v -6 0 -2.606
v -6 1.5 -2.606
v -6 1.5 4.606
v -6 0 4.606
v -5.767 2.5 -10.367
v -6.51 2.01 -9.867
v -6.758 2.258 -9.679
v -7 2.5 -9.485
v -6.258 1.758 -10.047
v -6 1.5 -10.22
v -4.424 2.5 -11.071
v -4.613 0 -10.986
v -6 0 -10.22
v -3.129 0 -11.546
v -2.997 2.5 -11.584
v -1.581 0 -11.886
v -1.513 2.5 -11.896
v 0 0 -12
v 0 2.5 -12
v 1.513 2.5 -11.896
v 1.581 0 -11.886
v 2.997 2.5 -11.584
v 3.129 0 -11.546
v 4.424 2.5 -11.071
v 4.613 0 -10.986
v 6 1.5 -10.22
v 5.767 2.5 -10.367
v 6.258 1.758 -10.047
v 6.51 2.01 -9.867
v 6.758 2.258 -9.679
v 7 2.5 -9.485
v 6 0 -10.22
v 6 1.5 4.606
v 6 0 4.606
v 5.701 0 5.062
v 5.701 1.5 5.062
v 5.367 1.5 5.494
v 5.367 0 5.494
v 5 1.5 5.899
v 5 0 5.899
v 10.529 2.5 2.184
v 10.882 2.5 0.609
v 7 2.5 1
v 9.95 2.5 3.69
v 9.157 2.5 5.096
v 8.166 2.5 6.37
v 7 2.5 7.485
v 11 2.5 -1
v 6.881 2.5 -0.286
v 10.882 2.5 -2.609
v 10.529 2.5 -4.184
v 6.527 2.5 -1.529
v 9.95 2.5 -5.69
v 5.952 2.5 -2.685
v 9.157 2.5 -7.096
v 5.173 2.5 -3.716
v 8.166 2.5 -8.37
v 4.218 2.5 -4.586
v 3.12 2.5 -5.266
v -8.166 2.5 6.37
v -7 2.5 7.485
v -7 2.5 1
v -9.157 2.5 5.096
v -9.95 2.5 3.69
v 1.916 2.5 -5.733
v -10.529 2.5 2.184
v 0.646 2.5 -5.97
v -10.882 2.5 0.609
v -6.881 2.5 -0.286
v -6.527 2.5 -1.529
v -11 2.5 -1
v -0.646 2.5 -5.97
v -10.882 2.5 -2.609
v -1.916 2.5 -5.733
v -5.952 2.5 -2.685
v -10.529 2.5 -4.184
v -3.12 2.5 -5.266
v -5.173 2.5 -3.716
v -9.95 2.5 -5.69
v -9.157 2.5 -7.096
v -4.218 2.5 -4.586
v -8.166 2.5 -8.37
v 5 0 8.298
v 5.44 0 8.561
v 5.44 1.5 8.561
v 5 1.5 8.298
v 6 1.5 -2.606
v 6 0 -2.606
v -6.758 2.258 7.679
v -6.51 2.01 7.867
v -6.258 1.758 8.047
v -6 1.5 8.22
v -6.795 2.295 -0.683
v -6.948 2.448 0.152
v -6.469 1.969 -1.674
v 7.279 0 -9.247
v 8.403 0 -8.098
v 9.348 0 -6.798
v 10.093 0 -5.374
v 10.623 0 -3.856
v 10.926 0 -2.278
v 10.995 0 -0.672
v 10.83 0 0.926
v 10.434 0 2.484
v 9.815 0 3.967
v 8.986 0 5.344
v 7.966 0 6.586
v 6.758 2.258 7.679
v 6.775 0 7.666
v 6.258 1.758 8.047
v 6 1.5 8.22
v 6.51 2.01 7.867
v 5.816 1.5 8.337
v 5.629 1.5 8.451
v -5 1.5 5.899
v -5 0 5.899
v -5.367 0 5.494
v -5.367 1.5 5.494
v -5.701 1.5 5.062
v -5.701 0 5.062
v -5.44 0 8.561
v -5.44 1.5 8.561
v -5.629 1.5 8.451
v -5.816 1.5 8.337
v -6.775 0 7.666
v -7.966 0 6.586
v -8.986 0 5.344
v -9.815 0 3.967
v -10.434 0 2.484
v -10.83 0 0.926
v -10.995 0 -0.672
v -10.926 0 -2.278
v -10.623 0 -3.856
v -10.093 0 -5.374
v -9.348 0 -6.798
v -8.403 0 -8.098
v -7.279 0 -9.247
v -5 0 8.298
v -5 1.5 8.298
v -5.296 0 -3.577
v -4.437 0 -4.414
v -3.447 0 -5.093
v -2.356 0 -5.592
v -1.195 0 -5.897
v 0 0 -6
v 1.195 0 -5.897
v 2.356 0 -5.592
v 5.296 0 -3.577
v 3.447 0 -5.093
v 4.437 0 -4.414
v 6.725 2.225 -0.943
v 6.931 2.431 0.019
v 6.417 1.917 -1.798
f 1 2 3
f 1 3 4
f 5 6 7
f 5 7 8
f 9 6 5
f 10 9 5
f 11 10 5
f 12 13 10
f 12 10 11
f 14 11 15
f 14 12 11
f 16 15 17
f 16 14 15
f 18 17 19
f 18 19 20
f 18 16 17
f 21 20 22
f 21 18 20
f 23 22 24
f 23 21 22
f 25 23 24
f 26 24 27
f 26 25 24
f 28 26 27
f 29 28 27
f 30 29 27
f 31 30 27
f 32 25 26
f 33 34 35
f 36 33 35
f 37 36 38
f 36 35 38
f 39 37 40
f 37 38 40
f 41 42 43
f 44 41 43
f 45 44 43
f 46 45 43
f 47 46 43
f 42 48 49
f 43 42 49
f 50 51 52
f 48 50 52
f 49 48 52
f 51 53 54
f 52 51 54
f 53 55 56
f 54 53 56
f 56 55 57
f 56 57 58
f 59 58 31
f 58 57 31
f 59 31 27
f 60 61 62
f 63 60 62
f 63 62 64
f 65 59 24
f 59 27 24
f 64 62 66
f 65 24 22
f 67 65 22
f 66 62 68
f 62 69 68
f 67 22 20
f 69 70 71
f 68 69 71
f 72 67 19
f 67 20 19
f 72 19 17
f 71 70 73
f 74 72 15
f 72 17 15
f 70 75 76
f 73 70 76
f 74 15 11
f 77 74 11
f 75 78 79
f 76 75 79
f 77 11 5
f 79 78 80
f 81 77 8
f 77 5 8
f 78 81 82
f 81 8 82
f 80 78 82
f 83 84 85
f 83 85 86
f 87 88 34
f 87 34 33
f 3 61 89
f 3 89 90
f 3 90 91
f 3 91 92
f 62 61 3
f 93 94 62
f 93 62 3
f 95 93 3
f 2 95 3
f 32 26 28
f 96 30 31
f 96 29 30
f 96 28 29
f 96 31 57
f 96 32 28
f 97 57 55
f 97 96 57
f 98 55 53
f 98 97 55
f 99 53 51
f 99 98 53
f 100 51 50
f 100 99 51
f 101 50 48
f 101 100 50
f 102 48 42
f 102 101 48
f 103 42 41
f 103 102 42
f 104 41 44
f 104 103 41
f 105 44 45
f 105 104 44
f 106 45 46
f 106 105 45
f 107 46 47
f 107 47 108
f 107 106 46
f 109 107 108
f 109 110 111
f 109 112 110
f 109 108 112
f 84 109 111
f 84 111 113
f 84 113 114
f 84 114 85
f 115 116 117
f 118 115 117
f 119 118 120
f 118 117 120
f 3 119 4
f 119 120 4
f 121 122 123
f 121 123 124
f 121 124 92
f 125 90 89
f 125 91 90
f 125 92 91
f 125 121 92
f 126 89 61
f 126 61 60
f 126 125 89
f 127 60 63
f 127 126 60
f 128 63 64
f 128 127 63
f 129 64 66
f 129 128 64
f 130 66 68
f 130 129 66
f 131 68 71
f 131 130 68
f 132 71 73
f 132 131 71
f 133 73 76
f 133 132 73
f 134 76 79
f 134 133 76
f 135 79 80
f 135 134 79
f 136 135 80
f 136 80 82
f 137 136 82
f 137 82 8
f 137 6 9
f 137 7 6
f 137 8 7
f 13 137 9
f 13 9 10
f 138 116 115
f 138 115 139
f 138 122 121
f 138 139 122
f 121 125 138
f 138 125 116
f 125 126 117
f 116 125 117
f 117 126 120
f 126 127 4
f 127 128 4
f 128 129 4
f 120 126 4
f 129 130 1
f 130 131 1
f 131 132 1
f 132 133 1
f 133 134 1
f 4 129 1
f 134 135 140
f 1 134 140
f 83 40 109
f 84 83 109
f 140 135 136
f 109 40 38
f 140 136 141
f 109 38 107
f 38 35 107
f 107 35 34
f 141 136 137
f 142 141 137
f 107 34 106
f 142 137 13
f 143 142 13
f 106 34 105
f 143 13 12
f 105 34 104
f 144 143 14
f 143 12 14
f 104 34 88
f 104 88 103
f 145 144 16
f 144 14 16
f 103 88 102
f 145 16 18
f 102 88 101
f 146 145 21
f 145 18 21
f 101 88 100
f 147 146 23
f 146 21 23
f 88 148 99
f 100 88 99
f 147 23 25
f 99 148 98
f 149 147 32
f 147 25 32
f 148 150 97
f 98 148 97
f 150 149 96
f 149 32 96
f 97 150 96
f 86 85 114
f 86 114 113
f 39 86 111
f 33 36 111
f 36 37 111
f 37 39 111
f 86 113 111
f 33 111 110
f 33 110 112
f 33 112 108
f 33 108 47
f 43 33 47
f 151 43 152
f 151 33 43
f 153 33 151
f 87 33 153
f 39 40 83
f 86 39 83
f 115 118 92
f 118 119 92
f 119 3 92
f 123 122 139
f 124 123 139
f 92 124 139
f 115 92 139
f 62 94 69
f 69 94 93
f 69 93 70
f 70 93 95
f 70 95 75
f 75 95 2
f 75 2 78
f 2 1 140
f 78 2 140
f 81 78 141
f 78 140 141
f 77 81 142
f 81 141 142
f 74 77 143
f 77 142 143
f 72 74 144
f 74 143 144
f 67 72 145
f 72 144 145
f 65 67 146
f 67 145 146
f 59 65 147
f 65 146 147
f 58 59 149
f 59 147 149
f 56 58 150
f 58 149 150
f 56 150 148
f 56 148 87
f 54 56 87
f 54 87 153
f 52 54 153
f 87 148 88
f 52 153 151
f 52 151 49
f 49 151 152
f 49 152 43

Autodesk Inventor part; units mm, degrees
ref_plane "YZ Plane" through (0, 0, 0) normal (1, 0, 0) x (0, 1, 0)
ref_plane "XZ Plane" through (0, 0, 0) normal (0, 1, 0) x (-1, 0, 0)
ref_plane "XY Plane" through (0, 0, 0) normal (0, 0, 1) x (1, 0, 0)
sketch "Sketch1" plane through (0, 0, 0) normal (0, 0, 1) x (1, 0, 0)
  line L0 (0, 0) -> (-7, 0) construction
  line L1 (-7, 0) -> (-7, 2.5)
  line L2 (-7, 2.5) -> (-6, 1.5)
  line L3 (-6, 1.5) -> (-6, 0)
  line L4 (-7, 2.5) -> (-11, 2.5)
  line L5 (-11, 2.5) -> (-11, 0)
  line L6 (-11, 0) -> (-7, 0)
  line L7 (-7, 0) -> (-7, 2.5)
  line L8 (-7, 0) -> (-6, 0)
  dimension "d0" = 7
  dimension "d1" = 45
  dimension "d2" = 1
  dimension "d3" = 2.5
  dimension "d5" = 11
extrude "Extrusion1" add sketch "Sketch1" along normal mid plane 24
mirror "Mirror1" about plane through (0, 0, 0) normal (1, 0, 0) of "Extrusion1"
sketch "Sketch2" plane through (-11, 0, 12) normal (0, -1, 0) x (1, 0, 0)
  line L0 (5, -24) -> (5, 0) projected
  line L1 (0, 0) -> (5, 0) projected
  line L2 (0, -24) -> (0, 0) projected
  line L3 (5, -24) -> (0, -24) projected
  line L4 (17, -24) -> (17, 0) projected
  line L5 (17, -24) -> (22, -24) projected
  line L6 (22, -24) -> (22, 0) projected
  line L7 (22, 0) -> (17, 0) projected
  line L8 (11, -12) -> (11, -11)
  line L9 (5, -24) -> (5, 0) projected
  arc A0 (4, -11) -> (18, -11) centre (11, -11) ccw
  line L10 (11, -12) -> (11, -13)
  arc A1 (4, -21.4853) -> (18, -21.4853) centre (11, -13) ccw
  line L11 (17, -24) -> (17, 0) projected
  line L12 (4, 0) -> (4, -24) projected
  line L13 (18, 0) -> (18, -24) projected
  line L14 (4, -11) -> (4, -21.4853)
  line L15 (18, -11) -> (18, -21.4853)
  dimension "d8" = 1
  dimension "d11" = 7
  dimension "d12" = 11
extrude "Extrusion2" add sketch "Sketch2" against normal up to surface (2.5 mm away) contours A1 L12 A0 L0 | L0 A0 L4 A1 | L4 A0 L13 A1
sketch "Sketch3" plane through (-11, 0, 12) normal (0, -1, 0) x (1, 0, 0)
  line L0 (5, -14.6056) -> (5, 0) projected
  line L1 (0, 0) -> (5, 0) projected
  line L2 (0, -24) -> (0, 0) projected
  line L3 (5, -24) -> (0, -24) projected
  line L4 (5, -24) -> (5, -22.2195) projected
  arc A0 (5, -22.2195) -> (17, -22.2195) centre (11, -13) ccw projected
  line L5 (17, -24) -> (17, -22.2195) projected
  line L6 (17, -24) -> (22, -24) projected
  line L7 (22, -24) -> (22, 0) projected
  line L8 (22, 0) -> (17, 0) projected
  line L9 (17, -14.6056) -> (17, 0) projected
  arc A1 (5, -14.6056) -> (17, -14.6056) centre (11, -11) ccw projected
  line L10 (5, -14.6056) -> (5, 0) projected
  arc A2 (5, -14.6056) -> (17, -14.6056) centre (11, -11) ccw projected
  line L11 (6, -6.101) -> (6, -2.3397)
  line L12 (16, -6.101) -> (16, -2.3397)
  arc A3 (17, -3) -> (16, -2.3397) centre (11, -11) ccw
  arc A4 (6, -2.3397) -> (5, -3) centre (11, -11) ccw
  arc A5 (17, -7.3944) -> (16, -6.101) centre (11, -11) ccw
  arc A6 (6, -6.101) -> (5, -7.3944) centre (11, -11) ccw
  line L13 (17, -3) -> (17, -7.3944)
  line L14 (17, -14.6056) -> (17, 0) projected
  line L15 (5, -3) -> (5, -7.3944)
  point P0 (11, -12)
  dimension "d15" = 1
  dimension "d16" = 1
  dimension "d17" = 10
extrude "Extrusion3" add sketch "Sketch3" against normal blind 1.5 contours L0 A4 L11 A6 | A5 L12 A3 L9
sketch "Sketch4" plane through (-11, 0, 12) normal (0, -1, 0) x (1, 0, 0)
  line L0 (5, -14.6056) -> (5, -7.3944) construction
  arc A0 (6, -6.101) -> (5, -7.3944) centre (11, -11) ccw construction
  line L1 (6, -6.101) -> (6, -2.3397) construction
  arc A1 (6, -2.3397) -> (5, -3) centre (11, -11) ccw construction
  line L2 (5, -3) -> (5, 0) construction
  line L3 (0, 0) -> (5, 0) construction
  line L4 (0, -24) -> (0, 0) construction
  line L5 (5, -24) -> (0, -24) construction
  line L6 (5, -24) -> (5, -22.2195) construction
  arc A2 (5, -22.2195) -> (17, -22.2195) centre (11, -13) ccw construction
  line L7 (17, -24) -> (17, -22.2195) construction
  line L8 (17, -24) -> (22, -24) construction
  line L9 (22, -24) -> (22, 0) construction
  line L10 (22, 0) -> (17, 0) construction
  line L11 (17, -3) -> (17, 0) construction
  arc A3 (17, -3) -> (16, -2.3397) centre (11, -11) ccw construction
  line L12 (16, -2.3397) -> (16, -6.101) construction
  arc A4 (17, -7.3944) -> (16, -6.101) centre (11, -11) ccw construction
  line L13 (17, -14.6056) -> (17, -7.3944) construction
  arc A5 (5, -14.6056) -> (17, -14.6056) centre (11, -11) ccw construction
  circle A6 centre (11, -13) radius 11
  circle A7 centre (11, -13) radius 19.3975
  point P0 (11, -12)
extrude "Extrusion4" cut sketch "Sketch4" against normal through all
chamfer "Chamfer1" distance 0.5 angle 45 2 edges at (-5, 0.75, 8.798) (5, 0.75, 8.798)
equation "\"d16\" = d15"
properties part number "bottom_clip" material "ABS Plastic"
